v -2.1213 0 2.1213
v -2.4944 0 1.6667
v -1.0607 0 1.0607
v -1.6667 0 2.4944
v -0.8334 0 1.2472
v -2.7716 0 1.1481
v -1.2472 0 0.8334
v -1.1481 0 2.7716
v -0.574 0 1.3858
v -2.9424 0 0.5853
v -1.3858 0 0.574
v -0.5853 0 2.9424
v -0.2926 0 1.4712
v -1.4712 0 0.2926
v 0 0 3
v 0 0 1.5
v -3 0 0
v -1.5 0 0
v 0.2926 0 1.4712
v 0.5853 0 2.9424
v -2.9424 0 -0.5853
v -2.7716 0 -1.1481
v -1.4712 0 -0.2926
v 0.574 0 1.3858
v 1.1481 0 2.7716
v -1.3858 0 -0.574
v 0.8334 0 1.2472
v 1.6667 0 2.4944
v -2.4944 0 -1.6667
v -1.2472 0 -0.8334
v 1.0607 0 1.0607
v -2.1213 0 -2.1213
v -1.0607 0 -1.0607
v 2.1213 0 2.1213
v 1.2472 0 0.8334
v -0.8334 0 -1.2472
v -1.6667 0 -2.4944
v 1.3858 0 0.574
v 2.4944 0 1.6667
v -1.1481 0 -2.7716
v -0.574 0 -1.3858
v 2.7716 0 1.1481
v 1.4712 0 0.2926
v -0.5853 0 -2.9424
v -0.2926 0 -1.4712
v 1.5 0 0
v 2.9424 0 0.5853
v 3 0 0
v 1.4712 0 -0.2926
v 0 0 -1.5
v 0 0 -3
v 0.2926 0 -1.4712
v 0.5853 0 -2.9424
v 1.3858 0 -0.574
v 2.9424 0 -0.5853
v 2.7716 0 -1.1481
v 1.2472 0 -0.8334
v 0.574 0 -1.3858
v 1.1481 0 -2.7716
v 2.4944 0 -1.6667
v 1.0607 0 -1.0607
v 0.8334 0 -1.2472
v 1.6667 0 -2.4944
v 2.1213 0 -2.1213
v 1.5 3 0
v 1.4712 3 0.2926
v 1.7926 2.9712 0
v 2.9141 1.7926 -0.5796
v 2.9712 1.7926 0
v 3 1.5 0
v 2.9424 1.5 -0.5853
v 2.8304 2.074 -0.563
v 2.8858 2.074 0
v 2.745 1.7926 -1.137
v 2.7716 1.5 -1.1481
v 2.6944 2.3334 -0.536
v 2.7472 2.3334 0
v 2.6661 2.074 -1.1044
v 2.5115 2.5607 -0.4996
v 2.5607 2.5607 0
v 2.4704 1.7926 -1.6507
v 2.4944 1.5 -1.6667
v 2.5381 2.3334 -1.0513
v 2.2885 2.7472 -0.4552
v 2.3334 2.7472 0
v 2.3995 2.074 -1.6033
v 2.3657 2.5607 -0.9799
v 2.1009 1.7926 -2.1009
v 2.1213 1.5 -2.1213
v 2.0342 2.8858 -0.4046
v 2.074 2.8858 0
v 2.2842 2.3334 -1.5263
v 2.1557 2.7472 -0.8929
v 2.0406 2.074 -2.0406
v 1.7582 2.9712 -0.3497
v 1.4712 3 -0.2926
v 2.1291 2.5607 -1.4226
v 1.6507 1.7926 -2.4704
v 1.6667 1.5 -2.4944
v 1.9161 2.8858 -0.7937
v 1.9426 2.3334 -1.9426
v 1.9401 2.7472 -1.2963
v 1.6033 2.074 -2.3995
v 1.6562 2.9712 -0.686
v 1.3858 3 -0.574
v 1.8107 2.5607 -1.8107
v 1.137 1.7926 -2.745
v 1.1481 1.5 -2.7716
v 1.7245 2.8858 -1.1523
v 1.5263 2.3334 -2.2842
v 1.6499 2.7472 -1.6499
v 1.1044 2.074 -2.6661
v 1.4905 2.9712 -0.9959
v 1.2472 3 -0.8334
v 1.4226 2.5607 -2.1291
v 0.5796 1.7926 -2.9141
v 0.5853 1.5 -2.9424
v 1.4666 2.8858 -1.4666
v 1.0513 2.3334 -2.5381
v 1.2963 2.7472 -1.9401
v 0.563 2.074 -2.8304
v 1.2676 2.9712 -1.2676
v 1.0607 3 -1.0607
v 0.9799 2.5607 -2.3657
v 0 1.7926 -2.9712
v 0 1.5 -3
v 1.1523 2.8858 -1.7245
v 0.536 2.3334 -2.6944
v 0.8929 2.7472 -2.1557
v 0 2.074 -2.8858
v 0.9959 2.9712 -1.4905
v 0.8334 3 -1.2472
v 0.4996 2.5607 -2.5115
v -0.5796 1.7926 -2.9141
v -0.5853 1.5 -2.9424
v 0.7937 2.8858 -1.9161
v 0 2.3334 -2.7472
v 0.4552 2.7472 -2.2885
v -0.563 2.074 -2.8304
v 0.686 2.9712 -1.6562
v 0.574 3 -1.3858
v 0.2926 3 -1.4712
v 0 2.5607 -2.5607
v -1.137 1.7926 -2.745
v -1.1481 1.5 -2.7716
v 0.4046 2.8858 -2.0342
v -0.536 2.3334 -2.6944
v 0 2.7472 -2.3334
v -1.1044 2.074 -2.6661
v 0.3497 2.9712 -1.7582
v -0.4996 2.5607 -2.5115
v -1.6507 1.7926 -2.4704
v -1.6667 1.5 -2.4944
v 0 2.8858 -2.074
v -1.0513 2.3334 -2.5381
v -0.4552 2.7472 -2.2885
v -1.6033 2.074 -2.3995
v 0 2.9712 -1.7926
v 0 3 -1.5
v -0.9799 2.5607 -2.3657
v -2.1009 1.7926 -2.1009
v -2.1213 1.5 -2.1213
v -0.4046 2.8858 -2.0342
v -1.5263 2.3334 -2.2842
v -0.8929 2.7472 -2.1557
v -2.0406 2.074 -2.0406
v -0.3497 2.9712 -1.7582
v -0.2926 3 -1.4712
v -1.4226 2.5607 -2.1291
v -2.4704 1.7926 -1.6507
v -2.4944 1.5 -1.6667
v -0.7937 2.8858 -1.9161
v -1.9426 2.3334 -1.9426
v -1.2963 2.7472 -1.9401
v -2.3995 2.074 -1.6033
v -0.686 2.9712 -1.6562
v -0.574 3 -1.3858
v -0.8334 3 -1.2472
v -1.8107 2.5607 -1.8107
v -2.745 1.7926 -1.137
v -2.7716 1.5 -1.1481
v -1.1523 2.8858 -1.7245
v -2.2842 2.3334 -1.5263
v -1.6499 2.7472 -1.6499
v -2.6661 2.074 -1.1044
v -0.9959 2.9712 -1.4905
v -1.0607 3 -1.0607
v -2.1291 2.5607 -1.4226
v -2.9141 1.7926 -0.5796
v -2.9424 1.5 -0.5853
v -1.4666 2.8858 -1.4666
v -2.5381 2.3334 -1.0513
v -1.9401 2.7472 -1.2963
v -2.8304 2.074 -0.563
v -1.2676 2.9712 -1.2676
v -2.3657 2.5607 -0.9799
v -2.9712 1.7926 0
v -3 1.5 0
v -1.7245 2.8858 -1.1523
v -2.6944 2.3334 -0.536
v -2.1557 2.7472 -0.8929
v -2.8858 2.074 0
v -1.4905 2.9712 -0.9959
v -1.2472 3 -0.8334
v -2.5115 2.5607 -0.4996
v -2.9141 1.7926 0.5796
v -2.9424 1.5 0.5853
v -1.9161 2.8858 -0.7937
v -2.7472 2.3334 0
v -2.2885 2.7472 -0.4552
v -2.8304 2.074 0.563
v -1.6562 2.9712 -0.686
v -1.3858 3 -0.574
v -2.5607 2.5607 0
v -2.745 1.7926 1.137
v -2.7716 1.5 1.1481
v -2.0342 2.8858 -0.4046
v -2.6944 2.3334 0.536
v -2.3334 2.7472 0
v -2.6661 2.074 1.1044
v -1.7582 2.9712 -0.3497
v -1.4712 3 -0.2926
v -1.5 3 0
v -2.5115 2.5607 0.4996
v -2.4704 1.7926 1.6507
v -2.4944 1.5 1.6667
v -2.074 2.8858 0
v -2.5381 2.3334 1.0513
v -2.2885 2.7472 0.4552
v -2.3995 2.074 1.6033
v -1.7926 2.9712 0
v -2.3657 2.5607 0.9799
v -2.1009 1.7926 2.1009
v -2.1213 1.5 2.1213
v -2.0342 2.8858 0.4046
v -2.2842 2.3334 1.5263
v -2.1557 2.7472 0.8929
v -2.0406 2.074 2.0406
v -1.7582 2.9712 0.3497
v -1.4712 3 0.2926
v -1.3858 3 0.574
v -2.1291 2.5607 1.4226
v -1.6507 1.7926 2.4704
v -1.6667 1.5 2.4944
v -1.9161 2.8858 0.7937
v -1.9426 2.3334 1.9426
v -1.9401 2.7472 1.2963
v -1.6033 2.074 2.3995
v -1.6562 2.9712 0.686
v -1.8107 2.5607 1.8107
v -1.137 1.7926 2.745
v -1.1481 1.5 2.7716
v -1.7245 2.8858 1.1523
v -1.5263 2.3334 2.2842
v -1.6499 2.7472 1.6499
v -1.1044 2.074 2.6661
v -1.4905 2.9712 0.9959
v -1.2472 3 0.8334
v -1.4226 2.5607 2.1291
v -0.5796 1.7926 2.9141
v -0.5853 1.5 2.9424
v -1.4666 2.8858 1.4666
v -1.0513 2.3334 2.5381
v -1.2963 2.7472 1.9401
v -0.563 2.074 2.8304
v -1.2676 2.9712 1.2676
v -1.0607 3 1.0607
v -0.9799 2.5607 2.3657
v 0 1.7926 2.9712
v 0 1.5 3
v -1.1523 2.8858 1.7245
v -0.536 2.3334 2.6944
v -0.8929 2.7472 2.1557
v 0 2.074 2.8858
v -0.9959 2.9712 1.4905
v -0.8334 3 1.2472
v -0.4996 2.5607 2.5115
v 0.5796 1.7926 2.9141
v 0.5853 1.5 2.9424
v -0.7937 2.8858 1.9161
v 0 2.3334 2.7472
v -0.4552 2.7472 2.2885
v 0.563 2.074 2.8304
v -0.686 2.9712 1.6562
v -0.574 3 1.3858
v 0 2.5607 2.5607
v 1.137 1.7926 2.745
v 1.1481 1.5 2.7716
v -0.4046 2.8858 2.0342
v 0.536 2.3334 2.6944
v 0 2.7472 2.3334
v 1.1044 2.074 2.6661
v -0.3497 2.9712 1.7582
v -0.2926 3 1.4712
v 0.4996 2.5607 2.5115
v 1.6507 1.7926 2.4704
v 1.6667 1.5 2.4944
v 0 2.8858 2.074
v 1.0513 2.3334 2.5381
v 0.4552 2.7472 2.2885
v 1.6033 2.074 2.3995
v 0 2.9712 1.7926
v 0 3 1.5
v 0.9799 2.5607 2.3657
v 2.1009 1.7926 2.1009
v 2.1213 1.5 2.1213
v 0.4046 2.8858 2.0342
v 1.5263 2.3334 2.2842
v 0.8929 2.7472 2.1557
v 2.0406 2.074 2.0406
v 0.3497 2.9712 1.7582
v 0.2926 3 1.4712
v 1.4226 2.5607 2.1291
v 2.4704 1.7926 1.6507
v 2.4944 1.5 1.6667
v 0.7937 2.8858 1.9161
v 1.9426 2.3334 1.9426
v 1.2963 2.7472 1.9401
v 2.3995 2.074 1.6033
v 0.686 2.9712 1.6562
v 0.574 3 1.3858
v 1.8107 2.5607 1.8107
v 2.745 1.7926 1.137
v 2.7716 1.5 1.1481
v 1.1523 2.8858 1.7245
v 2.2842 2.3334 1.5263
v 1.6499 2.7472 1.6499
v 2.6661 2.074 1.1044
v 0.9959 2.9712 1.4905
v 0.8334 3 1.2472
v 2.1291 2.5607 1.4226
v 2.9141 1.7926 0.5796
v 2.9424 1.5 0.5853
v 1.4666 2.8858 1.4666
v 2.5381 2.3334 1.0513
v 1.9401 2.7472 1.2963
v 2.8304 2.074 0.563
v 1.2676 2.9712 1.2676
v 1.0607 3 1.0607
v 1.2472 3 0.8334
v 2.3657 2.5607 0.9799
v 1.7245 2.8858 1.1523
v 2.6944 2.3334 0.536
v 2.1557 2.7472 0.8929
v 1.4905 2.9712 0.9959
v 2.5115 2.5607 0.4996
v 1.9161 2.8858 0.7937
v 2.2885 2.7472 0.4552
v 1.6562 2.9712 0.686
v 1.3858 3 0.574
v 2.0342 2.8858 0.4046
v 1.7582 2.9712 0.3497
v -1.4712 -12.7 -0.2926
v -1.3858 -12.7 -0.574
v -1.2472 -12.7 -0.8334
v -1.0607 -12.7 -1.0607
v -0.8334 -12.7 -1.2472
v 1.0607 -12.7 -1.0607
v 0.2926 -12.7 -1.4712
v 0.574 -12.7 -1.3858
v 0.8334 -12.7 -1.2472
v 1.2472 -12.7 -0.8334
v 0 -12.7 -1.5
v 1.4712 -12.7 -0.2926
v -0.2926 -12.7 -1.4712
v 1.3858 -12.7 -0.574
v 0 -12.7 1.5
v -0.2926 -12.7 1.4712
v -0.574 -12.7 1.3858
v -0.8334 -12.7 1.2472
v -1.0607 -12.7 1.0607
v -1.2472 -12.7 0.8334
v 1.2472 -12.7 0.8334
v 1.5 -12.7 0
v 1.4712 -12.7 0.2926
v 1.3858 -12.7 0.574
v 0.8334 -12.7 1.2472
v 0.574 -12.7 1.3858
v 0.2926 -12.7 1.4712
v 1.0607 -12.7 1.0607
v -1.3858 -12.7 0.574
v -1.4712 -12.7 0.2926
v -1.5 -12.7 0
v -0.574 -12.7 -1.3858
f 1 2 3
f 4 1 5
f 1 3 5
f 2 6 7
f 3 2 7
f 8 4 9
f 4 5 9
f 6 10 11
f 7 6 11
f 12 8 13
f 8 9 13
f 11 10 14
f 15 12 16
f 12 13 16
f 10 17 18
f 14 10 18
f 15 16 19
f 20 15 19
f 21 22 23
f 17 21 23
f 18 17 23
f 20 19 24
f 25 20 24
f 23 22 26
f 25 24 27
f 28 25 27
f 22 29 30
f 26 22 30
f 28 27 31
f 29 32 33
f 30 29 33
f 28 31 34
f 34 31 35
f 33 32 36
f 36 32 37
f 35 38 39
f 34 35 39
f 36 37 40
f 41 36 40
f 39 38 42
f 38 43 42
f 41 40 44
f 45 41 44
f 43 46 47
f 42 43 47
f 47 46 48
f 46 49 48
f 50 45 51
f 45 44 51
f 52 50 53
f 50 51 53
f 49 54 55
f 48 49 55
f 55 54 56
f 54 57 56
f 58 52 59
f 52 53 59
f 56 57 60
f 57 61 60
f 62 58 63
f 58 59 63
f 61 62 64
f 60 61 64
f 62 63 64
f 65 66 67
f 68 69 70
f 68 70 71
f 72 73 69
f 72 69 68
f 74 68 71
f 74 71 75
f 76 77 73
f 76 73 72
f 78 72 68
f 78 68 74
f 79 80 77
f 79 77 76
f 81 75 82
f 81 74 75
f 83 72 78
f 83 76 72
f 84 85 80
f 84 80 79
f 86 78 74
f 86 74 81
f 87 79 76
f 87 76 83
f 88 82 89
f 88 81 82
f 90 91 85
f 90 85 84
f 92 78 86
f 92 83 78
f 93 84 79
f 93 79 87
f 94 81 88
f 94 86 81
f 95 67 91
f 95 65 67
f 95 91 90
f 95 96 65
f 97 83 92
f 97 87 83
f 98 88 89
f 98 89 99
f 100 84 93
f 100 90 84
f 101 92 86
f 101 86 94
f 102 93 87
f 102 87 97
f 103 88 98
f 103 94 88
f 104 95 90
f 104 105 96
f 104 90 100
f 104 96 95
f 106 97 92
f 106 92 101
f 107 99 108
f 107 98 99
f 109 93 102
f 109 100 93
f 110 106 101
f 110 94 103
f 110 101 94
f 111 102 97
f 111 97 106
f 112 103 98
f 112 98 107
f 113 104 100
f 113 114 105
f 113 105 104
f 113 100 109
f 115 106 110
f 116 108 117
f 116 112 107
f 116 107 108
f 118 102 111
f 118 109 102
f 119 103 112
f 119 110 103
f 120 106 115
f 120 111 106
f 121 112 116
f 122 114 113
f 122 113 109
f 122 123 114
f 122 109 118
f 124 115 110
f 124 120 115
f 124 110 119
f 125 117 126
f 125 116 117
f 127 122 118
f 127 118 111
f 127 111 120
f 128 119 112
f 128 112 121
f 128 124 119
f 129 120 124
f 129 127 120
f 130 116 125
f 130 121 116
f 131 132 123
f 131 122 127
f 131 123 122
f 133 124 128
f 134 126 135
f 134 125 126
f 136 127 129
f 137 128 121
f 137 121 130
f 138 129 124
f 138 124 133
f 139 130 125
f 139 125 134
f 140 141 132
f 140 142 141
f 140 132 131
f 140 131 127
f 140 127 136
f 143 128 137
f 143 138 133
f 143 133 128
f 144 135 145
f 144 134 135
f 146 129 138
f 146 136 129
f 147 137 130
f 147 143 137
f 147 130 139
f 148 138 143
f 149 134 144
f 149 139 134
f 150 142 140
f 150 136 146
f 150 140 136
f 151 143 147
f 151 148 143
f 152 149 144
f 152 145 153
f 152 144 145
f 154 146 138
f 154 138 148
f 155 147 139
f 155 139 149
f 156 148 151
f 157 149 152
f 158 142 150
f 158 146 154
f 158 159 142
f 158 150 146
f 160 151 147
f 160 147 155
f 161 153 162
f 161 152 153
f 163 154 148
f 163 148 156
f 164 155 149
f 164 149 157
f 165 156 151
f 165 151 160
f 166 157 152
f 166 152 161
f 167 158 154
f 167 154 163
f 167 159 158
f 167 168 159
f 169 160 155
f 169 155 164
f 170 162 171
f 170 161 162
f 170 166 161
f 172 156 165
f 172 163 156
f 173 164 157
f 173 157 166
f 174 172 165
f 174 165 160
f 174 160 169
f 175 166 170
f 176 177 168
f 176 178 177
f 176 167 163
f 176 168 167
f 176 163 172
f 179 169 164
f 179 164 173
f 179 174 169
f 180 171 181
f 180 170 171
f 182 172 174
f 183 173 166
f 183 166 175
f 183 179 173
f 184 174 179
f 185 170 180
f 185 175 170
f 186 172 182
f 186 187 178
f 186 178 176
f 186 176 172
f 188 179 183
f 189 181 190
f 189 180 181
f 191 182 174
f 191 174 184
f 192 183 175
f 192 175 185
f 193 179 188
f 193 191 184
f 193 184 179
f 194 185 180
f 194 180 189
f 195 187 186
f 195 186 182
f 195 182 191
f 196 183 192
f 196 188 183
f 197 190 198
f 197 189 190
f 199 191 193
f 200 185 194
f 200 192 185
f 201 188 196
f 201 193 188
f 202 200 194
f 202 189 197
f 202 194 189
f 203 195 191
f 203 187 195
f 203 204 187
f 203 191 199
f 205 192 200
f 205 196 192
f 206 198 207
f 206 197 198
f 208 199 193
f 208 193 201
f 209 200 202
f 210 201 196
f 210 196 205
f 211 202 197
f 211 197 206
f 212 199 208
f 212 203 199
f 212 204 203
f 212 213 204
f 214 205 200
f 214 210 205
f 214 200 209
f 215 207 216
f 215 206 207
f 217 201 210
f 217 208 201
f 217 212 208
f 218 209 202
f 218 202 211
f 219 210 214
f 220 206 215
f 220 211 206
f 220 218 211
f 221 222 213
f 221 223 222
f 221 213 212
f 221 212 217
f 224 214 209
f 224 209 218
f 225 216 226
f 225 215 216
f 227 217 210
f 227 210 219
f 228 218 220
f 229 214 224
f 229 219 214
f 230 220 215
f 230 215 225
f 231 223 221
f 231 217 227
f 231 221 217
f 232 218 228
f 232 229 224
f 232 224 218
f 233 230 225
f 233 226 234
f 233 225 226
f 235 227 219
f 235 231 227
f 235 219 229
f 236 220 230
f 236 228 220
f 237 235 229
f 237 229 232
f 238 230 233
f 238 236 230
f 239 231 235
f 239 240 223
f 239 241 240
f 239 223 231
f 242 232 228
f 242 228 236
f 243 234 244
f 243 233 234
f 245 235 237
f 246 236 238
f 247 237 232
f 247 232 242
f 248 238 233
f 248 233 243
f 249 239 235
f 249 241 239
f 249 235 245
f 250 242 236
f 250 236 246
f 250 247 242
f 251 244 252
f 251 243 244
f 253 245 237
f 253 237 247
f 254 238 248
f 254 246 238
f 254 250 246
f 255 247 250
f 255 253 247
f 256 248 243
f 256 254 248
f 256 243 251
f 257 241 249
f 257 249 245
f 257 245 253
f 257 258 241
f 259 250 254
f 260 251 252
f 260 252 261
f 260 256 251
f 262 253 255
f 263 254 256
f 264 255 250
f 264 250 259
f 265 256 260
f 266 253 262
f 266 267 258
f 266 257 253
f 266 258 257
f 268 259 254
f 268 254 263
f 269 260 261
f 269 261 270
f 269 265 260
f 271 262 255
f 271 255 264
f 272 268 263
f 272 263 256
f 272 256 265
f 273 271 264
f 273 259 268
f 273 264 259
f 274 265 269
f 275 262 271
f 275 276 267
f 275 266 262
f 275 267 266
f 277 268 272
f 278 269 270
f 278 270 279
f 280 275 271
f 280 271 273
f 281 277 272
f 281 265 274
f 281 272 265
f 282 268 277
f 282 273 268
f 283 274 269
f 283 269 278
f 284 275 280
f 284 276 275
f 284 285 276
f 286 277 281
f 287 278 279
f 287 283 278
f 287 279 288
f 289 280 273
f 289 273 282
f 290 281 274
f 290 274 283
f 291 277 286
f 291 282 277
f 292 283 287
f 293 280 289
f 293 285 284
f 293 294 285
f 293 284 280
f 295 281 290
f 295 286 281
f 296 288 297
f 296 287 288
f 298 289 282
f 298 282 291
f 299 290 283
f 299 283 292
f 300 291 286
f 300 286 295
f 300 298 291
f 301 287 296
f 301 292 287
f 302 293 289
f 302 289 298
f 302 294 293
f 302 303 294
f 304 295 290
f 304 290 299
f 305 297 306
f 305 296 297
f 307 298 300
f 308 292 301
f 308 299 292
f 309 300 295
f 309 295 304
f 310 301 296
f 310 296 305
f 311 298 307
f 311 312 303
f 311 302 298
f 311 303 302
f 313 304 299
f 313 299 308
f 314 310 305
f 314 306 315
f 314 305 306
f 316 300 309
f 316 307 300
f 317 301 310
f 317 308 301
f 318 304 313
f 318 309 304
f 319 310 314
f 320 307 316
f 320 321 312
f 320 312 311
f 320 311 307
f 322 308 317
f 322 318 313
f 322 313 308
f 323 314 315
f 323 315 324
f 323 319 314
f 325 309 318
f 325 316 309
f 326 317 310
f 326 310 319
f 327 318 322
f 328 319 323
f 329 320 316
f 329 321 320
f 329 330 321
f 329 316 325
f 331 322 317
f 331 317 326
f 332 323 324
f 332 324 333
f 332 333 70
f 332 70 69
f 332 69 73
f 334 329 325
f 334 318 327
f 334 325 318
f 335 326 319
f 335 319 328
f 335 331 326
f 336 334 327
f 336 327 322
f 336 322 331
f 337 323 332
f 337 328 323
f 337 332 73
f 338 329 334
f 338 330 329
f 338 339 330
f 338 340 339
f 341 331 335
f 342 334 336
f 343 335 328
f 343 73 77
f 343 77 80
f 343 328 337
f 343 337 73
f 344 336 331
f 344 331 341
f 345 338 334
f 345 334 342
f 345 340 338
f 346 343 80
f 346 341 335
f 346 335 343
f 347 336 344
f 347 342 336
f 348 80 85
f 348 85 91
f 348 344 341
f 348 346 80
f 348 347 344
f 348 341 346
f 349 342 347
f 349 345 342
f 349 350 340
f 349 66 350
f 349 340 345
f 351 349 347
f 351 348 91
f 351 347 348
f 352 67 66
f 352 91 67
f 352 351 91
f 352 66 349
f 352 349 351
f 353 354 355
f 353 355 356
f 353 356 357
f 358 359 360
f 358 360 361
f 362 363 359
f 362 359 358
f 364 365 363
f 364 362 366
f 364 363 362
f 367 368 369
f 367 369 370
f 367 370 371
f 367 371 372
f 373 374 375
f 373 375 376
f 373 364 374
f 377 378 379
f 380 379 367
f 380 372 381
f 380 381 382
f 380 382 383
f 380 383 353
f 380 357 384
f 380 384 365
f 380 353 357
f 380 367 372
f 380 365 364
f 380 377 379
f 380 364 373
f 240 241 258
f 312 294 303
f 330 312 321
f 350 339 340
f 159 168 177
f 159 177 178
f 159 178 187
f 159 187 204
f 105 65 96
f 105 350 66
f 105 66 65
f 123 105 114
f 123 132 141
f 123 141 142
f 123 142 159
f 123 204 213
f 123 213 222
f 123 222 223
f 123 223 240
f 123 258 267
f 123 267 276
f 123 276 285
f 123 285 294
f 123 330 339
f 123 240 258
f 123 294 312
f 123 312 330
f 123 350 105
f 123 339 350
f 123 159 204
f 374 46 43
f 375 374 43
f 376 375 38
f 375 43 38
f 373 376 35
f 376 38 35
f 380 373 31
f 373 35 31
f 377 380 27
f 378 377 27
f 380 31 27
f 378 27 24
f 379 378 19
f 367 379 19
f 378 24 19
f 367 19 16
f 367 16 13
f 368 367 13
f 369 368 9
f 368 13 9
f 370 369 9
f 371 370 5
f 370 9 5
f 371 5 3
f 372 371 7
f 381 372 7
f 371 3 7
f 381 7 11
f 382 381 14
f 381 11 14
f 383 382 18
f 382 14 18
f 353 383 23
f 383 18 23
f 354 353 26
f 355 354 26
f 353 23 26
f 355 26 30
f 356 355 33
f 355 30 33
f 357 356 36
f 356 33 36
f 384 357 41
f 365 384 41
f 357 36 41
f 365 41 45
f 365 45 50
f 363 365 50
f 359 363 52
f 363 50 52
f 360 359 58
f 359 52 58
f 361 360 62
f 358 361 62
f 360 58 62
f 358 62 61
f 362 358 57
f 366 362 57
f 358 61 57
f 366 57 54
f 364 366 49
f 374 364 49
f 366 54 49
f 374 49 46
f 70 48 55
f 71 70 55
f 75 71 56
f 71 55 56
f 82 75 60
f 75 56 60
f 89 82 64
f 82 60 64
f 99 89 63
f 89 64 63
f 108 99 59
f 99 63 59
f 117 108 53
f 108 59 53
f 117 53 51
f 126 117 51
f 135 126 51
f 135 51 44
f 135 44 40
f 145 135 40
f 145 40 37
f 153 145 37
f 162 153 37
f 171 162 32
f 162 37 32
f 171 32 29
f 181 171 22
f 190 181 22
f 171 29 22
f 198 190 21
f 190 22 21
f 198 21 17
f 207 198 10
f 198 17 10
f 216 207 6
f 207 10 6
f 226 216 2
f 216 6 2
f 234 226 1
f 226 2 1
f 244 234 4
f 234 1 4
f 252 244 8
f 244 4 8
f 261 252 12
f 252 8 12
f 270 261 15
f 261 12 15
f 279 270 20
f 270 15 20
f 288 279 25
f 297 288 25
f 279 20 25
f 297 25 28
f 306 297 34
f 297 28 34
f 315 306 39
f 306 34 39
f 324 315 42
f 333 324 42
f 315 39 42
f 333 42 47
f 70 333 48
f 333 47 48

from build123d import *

# Parameters (mm, degrees)
SKETCH1_R           = 3
BOSS_EXTRUDE1_DEPTH = 3
FILLET1_R           = 1.5
SKETCH2_R           = 1.5
BOSS_EXTRUDE2_DEPTH = 12.7


with BuildPart() as part:
    # Sketch1 → Boss-Extrude1 (new body)
    with BuildSketch(Plane(origin=(0, 0, 0), x_dir=(1, 0, 0), z_dir=(0, 1, 0))):
        Circle(SKETCH1_R)
    extrude(amount=BOSS_EXTRUDE1_DEPTH)

    # Fillet1
    fillet1_edges = [part.edges().sort_by_distance(p)[0] for p in [
        (-3, 3, 0),
    ]]
    fillet(fillet1_edges, radius=FILLET1_R)

    # Sketch2 → Boss-Extrude2 (add)
    with BuildSketch(Plane.XZ):
        Circle(SKETCH2_R)
    extrude(amount=BOSS_EXTRUDE2_DEPTH)


solid = part.part
